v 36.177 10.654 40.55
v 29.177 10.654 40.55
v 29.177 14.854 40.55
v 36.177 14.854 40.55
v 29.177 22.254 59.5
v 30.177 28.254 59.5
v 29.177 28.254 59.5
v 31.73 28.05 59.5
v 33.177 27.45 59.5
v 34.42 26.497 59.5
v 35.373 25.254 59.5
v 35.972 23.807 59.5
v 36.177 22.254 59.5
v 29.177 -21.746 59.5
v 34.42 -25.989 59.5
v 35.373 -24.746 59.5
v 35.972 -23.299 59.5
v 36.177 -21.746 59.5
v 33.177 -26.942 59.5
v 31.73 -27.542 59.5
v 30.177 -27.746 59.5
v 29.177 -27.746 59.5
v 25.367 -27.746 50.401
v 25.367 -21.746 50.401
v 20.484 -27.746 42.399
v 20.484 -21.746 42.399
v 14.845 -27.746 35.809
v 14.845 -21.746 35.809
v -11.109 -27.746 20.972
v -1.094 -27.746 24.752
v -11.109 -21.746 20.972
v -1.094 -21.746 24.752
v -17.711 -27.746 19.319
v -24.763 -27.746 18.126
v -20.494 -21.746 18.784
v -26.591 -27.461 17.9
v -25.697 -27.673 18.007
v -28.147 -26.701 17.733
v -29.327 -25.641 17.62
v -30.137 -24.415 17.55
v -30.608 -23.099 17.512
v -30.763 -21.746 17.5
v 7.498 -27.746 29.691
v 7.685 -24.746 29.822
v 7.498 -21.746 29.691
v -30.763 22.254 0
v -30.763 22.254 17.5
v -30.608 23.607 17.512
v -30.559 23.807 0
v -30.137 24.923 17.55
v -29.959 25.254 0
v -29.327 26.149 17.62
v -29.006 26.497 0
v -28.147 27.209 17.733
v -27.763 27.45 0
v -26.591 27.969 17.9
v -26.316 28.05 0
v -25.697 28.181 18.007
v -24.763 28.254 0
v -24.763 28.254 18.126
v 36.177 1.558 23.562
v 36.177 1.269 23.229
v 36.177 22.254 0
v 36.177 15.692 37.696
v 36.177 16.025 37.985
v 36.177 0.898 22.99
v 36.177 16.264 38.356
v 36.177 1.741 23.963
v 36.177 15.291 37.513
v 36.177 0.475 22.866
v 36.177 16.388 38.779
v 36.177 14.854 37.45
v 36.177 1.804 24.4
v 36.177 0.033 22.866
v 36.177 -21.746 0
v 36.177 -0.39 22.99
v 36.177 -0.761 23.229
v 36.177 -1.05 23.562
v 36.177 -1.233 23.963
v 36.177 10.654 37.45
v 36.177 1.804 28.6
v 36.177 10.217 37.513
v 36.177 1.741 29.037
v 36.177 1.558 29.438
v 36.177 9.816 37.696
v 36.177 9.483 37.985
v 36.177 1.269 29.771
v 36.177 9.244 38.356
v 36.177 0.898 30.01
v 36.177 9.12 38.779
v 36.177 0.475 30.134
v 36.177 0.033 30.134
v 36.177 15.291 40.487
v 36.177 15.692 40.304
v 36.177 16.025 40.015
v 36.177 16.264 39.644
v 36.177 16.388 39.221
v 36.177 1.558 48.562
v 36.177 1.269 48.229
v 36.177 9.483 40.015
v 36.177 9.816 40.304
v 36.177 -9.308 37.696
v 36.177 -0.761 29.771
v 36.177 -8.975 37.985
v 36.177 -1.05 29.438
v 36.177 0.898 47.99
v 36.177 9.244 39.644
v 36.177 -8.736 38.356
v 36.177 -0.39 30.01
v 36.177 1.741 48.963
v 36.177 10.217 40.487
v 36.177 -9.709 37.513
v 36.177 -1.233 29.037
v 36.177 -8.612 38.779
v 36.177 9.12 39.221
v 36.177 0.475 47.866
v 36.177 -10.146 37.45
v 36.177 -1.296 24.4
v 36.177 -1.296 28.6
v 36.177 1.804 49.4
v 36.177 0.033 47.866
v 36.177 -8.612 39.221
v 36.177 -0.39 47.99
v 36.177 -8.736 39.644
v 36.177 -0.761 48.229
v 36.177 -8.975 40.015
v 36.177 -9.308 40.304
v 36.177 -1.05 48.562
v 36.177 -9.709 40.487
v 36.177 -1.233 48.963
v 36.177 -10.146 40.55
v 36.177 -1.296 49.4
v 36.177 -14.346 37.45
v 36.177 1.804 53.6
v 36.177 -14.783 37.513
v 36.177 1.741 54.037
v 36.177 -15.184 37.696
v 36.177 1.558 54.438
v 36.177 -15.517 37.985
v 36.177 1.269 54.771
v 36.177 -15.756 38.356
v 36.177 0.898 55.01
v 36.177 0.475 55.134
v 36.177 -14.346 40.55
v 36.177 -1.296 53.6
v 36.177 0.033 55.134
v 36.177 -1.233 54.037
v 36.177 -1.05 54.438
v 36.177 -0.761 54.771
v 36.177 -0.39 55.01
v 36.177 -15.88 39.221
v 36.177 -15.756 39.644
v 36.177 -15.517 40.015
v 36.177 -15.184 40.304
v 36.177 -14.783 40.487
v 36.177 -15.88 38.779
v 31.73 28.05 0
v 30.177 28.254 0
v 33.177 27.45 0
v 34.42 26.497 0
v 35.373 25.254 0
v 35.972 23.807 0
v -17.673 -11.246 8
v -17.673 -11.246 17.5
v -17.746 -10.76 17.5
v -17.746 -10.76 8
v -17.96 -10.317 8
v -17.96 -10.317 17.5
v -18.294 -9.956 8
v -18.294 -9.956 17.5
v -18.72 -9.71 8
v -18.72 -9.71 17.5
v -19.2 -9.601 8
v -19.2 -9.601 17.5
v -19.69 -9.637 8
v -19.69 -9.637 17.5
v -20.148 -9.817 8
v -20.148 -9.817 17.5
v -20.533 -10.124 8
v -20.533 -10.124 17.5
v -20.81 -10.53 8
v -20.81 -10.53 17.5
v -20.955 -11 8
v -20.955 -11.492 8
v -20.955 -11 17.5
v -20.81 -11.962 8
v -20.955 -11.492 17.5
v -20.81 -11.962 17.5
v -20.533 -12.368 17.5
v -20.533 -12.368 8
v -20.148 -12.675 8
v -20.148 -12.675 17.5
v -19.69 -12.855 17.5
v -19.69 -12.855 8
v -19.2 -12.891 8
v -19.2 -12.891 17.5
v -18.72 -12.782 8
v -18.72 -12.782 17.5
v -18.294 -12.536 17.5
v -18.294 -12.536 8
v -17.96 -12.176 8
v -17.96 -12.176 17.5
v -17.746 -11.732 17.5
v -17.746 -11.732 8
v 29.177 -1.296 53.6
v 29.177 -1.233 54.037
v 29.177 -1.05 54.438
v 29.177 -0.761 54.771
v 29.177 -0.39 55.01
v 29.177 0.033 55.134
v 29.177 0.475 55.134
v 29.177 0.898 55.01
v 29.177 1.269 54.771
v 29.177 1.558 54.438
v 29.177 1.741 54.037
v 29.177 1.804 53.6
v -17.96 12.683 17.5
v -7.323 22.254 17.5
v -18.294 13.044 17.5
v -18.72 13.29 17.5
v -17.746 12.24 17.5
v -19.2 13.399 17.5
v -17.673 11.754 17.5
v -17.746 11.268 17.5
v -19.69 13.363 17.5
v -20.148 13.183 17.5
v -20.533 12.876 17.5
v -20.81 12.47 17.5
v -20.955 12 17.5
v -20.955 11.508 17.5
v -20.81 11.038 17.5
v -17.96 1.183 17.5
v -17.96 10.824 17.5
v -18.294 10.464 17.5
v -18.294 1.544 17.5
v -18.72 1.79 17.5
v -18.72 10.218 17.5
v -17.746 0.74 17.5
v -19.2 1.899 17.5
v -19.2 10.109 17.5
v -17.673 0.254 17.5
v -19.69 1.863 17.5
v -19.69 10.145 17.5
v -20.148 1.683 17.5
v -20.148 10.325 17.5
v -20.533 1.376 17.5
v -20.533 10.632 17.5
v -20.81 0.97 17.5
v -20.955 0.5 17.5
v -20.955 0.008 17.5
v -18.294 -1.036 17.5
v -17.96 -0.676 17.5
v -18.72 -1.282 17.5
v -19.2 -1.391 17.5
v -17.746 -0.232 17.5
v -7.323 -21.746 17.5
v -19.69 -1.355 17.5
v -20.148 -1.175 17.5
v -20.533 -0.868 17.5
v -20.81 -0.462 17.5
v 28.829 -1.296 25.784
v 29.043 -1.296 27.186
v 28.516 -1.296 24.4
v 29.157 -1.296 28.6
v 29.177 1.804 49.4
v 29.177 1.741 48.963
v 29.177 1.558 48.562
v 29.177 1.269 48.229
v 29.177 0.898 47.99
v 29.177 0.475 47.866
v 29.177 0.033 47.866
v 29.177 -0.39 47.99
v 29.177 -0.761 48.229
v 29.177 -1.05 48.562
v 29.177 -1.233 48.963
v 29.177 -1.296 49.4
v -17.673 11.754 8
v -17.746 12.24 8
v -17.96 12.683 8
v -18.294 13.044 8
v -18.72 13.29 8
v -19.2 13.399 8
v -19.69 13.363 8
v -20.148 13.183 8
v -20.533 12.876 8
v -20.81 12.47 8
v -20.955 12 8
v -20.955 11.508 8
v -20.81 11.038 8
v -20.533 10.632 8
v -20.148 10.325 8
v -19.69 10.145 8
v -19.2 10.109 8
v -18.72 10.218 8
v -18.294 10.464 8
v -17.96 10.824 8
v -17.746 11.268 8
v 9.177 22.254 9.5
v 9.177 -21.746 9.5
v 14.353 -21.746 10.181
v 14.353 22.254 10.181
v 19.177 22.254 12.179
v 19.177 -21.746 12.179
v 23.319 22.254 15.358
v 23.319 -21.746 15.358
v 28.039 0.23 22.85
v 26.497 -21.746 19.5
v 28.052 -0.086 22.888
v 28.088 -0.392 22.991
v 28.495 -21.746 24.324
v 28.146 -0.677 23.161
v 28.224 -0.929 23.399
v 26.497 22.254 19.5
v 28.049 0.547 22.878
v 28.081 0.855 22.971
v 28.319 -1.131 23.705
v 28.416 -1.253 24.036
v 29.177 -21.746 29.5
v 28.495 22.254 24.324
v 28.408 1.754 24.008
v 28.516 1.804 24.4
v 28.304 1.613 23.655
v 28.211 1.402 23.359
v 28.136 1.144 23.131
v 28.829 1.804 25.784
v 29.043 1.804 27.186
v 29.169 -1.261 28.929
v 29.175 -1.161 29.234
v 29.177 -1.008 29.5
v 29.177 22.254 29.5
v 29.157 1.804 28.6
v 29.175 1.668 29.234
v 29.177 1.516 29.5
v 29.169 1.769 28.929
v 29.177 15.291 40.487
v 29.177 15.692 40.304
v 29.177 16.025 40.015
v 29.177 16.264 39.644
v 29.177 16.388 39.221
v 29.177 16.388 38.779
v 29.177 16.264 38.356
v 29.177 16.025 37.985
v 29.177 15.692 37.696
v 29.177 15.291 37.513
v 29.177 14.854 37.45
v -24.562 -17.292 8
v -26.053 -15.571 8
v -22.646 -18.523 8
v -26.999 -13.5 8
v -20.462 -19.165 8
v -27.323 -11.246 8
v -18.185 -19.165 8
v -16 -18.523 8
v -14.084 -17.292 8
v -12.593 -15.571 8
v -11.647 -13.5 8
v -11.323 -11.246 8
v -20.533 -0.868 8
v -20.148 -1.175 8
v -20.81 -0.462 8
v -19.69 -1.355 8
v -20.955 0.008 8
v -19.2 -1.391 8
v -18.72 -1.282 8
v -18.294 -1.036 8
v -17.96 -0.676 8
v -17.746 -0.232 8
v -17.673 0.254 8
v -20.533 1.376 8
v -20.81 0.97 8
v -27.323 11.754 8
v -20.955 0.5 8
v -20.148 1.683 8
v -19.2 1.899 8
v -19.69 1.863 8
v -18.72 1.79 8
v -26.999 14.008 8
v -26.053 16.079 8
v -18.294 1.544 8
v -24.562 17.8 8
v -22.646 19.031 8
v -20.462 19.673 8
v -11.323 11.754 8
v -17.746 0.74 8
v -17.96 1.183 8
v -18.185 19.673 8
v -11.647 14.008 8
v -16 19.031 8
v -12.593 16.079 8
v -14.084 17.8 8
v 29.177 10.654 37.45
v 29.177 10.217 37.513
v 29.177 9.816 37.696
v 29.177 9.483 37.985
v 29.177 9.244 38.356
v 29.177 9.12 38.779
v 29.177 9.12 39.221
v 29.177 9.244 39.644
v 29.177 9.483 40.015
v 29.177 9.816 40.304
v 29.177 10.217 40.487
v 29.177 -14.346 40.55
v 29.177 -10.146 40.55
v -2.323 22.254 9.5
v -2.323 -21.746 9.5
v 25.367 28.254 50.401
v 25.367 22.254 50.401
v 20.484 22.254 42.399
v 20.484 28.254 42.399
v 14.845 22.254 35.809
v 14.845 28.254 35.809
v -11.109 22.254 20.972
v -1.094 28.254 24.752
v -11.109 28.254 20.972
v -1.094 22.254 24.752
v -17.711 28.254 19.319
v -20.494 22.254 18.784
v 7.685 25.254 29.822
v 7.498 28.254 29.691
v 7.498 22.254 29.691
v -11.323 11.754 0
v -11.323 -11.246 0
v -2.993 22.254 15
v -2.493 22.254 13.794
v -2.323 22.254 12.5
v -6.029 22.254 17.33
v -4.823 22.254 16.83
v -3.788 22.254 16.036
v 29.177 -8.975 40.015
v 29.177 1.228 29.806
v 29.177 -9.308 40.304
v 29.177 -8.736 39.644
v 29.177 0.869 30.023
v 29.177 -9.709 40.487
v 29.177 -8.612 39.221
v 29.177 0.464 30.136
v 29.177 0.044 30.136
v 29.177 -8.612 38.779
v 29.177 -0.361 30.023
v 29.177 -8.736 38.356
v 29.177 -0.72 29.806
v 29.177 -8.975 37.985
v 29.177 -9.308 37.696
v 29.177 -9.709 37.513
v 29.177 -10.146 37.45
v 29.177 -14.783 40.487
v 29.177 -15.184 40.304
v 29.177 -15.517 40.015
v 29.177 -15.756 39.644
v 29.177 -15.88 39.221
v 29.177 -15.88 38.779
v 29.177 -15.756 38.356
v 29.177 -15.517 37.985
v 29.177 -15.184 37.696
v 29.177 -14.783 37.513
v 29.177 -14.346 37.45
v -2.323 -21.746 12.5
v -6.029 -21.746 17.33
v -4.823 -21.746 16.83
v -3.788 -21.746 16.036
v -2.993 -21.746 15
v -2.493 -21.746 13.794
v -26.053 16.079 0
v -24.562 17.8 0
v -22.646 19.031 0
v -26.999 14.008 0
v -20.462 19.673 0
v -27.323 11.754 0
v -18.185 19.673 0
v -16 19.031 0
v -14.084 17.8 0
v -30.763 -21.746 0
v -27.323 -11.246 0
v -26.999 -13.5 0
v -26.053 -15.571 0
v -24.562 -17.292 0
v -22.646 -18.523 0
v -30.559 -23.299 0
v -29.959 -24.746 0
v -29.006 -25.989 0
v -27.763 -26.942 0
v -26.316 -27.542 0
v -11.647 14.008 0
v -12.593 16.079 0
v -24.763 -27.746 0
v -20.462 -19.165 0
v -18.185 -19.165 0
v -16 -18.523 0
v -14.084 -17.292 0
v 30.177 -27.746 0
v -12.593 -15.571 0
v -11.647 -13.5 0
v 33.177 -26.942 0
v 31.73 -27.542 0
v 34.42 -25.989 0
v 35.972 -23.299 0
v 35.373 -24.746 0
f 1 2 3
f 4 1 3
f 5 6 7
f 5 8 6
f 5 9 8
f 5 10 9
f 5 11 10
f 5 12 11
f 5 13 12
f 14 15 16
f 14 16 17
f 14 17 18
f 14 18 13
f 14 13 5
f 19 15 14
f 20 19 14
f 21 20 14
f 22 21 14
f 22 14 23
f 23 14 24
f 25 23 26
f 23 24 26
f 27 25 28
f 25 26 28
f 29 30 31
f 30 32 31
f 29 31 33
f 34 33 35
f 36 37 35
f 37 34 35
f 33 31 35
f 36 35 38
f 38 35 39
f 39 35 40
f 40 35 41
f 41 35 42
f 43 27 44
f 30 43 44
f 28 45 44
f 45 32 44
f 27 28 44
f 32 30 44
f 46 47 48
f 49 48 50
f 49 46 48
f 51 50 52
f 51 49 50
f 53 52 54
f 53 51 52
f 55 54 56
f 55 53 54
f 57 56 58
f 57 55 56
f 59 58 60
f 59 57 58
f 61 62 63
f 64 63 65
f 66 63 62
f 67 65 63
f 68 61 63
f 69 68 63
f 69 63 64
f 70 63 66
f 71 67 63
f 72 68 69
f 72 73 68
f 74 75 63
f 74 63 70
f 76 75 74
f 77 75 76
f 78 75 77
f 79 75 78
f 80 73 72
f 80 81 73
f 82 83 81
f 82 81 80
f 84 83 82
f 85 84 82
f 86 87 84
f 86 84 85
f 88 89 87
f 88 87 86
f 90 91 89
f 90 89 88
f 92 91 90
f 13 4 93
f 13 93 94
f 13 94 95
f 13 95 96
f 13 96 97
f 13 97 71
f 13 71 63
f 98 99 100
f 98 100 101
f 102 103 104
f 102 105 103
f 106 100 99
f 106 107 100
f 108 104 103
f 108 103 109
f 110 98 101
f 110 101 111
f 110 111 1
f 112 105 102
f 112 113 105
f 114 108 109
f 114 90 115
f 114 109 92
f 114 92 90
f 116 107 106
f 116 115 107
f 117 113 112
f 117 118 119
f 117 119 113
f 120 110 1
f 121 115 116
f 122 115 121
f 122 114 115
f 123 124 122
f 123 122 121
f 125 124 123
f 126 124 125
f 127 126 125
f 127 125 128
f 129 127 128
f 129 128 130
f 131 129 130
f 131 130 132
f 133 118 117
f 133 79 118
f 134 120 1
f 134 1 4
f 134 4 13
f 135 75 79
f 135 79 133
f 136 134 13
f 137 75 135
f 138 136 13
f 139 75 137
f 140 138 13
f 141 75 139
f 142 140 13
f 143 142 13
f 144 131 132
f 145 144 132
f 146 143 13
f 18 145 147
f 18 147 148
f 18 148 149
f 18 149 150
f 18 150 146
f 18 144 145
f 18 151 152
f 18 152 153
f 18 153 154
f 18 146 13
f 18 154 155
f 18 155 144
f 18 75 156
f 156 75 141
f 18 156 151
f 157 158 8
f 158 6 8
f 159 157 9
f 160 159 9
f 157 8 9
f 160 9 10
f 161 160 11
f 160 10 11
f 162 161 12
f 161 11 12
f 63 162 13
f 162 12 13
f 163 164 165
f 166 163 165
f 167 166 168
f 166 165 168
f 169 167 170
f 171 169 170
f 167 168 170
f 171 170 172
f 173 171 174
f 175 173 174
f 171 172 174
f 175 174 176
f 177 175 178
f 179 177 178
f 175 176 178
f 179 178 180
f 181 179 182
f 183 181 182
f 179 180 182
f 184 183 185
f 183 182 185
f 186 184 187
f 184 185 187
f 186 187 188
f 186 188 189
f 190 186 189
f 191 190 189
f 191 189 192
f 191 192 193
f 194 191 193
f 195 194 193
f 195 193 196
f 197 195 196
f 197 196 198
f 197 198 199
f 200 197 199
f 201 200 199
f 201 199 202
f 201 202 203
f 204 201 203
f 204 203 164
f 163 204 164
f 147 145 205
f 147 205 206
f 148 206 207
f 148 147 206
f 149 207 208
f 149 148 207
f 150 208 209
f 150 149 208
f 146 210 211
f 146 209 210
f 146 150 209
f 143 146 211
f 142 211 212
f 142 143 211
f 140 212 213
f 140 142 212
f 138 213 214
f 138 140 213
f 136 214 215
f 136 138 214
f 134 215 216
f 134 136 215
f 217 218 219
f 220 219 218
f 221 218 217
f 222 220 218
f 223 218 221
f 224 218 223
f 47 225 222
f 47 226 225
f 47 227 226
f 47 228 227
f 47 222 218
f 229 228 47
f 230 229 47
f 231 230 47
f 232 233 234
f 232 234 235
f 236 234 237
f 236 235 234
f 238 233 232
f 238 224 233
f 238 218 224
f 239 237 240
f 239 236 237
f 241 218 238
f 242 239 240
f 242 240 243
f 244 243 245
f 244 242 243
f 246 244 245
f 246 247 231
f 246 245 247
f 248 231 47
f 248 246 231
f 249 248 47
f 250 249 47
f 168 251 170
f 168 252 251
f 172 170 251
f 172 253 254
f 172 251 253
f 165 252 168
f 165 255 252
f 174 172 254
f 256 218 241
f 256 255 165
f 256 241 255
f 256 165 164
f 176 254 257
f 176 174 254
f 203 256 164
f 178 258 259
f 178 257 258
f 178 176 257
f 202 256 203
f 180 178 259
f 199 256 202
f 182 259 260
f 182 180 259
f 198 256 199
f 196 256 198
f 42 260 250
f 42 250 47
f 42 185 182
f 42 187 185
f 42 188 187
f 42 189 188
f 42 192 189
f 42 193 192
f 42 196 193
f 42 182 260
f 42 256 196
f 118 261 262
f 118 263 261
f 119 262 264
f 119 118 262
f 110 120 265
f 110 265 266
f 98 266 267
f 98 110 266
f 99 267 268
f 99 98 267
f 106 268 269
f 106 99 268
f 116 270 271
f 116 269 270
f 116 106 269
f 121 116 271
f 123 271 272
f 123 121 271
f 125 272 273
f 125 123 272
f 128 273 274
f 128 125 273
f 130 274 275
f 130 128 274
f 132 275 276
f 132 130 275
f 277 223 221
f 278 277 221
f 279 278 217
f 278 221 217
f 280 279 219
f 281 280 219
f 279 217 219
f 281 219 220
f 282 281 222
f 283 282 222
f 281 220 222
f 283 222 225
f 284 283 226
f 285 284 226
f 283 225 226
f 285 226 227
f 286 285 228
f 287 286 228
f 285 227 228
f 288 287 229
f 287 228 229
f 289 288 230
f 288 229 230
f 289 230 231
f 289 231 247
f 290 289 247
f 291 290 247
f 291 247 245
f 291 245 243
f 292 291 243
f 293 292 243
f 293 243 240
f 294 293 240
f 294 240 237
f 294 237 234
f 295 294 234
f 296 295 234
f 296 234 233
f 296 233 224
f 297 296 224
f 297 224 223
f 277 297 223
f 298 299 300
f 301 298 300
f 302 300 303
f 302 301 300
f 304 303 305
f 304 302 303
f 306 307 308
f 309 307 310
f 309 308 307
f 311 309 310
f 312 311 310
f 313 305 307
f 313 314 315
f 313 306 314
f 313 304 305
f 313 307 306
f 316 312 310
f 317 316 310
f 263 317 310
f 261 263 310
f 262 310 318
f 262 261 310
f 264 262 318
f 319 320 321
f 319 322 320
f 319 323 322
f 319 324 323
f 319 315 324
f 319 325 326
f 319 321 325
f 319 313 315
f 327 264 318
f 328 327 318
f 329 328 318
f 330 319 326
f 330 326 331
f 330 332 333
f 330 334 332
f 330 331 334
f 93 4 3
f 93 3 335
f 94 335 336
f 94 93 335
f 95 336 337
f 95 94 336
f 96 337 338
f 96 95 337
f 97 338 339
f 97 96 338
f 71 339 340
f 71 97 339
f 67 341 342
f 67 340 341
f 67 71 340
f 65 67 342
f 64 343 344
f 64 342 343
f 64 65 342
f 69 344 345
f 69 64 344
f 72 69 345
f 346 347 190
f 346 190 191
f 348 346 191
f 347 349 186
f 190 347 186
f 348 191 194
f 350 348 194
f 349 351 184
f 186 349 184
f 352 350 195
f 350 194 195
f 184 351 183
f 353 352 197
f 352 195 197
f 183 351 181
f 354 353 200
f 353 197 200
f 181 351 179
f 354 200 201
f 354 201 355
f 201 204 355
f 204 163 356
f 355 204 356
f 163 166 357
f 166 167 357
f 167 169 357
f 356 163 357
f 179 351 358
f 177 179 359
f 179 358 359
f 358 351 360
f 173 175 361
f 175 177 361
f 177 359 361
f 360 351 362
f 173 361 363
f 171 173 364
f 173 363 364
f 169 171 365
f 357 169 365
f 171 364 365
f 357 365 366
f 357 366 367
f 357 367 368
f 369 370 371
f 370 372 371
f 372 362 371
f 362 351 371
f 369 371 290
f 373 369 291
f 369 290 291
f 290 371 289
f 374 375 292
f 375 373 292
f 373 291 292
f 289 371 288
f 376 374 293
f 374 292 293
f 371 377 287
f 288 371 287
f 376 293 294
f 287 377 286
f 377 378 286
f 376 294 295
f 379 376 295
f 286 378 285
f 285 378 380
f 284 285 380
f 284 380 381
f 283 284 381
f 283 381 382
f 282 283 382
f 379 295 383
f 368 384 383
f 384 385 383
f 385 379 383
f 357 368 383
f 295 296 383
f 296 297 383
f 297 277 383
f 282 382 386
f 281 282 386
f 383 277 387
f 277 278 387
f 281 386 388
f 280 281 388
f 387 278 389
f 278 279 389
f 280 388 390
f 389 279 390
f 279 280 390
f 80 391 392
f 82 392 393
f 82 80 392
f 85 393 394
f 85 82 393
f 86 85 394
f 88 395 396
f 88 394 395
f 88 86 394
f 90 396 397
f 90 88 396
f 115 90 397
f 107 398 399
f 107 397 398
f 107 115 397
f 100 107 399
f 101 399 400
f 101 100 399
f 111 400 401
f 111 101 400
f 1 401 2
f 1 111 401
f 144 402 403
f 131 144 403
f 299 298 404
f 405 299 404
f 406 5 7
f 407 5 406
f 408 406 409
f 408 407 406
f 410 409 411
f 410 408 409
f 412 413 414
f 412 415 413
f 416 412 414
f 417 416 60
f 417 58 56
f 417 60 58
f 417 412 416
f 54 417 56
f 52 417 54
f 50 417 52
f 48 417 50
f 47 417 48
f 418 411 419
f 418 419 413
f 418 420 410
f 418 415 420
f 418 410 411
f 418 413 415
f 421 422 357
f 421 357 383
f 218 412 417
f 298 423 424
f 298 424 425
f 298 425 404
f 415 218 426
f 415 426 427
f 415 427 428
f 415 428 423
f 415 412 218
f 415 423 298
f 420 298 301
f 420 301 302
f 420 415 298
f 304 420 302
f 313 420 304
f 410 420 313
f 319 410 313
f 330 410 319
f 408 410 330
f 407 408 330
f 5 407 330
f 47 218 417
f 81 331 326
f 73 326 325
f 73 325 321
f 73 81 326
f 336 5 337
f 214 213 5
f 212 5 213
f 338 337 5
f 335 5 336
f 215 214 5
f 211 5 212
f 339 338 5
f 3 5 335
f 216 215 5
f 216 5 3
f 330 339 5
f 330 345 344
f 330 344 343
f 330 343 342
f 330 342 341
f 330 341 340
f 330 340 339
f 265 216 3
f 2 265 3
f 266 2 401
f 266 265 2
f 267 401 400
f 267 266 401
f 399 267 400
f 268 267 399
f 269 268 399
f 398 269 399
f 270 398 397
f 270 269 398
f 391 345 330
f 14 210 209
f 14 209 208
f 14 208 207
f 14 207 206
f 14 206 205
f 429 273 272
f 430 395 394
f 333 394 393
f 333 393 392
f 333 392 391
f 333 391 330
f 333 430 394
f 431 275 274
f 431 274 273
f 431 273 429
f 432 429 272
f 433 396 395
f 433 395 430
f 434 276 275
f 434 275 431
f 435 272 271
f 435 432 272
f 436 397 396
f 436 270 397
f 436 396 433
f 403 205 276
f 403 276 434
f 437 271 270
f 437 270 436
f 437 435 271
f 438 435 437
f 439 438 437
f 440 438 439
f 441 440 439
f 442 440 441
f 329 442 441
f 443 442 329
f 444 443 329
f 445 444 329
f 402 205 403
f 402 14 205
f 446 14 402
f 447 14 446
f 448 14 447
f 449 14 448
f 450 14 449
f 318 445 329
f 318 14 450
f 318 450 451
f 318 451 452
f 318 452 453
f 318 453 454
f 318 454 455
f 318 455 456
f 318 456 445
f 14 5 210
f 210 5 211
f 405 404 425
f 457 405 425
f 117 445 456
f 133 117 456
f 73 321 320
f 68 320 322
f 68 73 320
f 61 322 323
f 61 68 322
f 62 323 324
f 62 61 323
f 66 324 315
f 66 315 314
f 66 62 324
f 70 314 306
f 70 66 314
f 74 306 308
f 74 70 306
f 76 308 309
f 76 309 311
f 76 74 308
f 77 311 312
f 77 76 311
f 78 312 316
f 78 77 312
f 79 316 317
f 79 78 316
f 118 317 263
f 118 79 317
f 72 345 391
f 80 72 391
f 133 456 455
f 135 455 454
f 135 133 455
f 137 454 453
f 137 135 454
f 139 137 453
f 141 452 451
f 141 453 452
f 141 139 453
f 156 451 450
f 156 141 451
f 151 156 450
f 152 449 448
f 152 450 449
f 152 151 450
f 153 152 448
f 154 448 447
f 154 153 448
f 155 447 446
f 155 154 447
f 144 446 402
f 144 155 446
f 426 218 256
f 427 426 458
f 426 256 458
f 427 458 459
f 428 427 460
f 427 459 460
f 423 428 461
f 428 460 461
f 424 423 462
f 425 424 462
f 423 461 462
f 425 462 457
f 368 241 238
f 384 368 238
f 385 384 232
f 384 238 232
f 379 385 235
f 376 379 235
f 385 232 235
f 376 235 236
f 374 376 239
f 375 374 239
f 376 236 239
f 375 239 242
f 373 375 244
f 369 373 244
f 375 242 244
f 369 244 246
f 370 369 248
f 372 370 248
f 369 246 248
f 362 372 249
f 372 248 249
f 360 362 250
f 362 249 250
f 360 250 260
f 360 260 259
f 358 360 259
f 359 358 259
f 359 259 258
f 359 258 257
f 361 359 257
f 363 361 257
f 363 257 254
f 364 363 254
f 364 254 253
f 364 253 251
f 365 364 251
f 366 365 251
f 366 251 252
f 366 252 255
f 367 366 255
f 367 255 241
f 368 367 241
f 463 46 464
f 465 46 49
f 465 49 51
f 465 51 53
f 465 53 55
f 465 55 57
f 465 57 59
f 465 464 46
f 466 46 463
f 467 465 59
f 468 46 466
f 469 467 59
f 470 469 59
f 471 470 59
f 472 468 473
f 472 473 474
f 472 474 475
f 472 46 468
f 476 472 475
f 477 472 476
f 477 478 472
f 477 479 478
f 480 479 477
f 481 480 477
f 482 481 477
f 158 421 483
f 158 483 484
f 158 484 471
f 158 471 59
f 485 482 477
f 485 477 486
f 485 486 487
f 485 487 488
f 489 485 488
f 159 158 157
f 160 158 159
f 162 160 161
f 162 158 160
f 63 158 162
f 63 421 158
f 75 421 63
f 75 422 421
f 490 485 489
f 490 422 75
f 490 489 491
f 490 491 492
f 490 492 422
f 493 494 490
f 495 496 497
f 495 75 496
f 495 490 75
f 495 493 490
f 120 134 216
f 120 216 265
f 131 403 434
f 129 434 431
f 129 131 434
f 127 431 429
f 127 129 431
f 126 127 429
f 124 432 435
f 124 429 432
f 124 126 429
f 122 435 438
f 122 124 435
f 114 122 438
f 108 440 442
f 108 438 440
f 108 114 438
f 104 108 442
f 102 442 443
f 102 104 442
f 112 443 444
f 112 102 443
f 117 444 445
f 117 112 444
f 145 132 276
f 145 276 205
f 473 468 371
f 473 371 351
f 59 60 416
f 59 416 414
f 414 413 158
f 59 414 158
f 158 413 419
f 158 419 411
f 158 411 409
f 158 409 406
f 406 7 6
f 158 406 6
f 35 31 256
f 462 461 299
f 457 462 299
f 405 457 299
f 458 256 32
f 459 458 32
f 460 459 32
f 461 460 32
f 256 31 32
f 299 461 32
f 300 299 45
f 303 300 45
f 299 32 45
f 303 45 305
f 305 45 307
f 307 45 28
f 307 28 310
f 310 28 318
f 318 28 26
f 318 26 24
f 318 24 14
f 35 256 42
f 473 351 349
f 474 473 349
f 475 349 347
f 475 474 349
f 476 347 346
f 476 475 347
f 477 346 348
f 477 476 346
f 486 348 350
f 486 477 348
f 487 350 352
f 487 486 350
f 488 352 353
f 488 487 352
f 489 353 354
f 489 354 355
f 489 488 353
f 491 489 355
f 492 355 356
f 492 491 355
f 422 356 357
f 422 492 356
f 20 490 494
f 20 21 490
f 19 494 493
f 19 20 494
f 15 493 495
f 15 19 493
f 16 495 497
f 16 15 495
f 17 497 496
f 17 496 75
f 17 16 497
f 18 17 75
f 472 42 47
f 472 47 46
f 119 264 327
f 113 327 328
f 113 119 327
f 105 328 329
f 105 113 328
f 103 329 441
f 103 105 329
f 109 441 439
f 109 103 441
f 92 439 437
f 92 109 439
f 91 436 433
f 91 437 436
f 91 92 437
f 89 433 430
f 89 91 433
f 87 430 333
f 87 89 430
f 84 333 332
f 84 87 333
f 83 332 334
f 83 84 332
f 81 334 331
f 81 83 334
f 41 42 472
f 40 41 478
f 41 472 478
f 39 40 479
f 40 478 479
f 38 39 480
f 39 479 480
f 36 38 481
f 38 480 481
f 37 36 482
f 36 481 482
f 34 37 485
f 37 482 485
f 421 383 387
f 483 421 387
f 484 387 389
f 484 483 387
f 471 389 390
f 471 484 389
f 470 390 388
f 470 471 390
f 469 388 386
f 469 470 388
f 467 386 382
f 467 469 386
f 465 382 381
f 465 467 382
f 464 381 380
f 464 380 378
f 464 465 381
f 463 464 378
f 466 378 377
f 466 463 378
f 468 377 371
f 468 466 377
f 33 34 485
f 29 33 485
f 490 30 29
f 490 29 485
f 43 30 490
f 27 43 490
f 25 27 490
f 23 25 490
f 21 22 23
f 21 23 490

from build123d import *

# Parameters (mm, degrees)
ESBO_O1_W                = 66.94
ESBO_O1_H                = 40
RESSALTO_EXTRUS_O1_DEPTH = 9.5
ESBO_O2_W                = 7
ESBO_O2_H                = 40
RESSALTO_EXTRUS_O2_DEPTH = 50
ESBO_O3_W                = 28.44
ESBO_O3_H                = 40
RESSALTO_EXTRUS_O3_DEPTH = 8
RESSALTO_EXTRUS_O4_DEPTH = 2
RESSALTO_EXTRUS_O5_DEPTH = 6
FILETE1_R                = 5
FILETE2_R                = 20
ESBO_O6_R                = 1.65
CORTE_EXTRUS_O1_DEPTH    = 63.217786628
CORTE_EXTRUS_O2_DEPTH    = 8
FILETE4_R                = 6
CORTE_EXTRUS_O3_DEPTH    = 94.912194911


with BuildPart() as part:
    # Esboço1 → Ressalto-extrusão1 (new body)
    with BuildSketch(Plane.XY):
        with Locations((2.706874237, 0.253968254)):
            Rectangle(ESBO_O1_W, ESBO_O1_H)
    extrude(amount=RESSALTO_EXTRUS_O1_DEPTH)

    # Esboço2 → Ressalto-extrusão2 (add)
    with BuildSketch(Plane.XY.offset(9.5)):
        with Locations((32.676874237, 0.253968254)):
            Rectangle(ESBO_O2_W, ESBO_O2_H)
    extrude(amount=RESSALTO_EXTRUS_O2_DEPTH)

    # Esboço3 → Ressalto-extrusão3 (add)
    with BuildSketch(Plane.XY.offset(9.5)):
        with Locations((-16.543125763, 0.253968254)):
            Rectangle(ESBO_O3_W, ESBO_O3_H)
    extrude(amount=RESSALTO_EXTRUS_O3_DEPTH)

    # Esboço4 → Ressalto-extrusão4 (add)
    with BuildSketch(Plane.XZ.offset(19.746031746)):
        Polygon((-2.323125763, 9.5), (-2.323125763, 17.5), (-30.763125763, 17.5), (-30.763125763, 0), (36.176874237, 0), (36.176874237, 59.5), (29.176874237, 59.5), (29.176874237, 9.5), align=None)
    ressalto_extrus_o4 = extrude(amount=RESSALTO_EXTRUS_O4_DEPTH)

    # Espelhar1: Ressalto-extrusão4 across plane
    add(ressalto_extrus_o4.mirror(Plane.ZX.offset(0.253968254)))

    # Esboço5 → Ressalto-extrusão5 (add)
    with BuildSketch(Plane.XZ.offset(21.746031746)):
        with BuildLine():
            Line((36.176874237, 59.5), (29.176874237, 59.5))
            add(Edge.make_bspline(
                [(29.176874237, 59.5), (16.163128622, 21.143295095), (-30.763125763, 17.5)],
                knots=[0, 0, 0, 1, 1, 1], degree=2))
            Line((-30.763125763, 17.5), (-30.763125763, 0))
            Line((-30.763125763, 0), (36.176874237, 0))
            Line((36.176874237, 0), (36.176874237, 59.5))
        make_face()
    ressalto_extrus_o5 = extrude(amount=RESSALTO_EXTRUS_O5_DEPTH)

    # Espelhar2: Ressalto-extrusão5 across plane
    add(ressalto_extrus_o5.mirror(Plane.ZX.offset(0.253968254)))

    # Filete1
    filete1_edges = [part.edges().sort_by_distance(p)[0] for p in [
        (-2.323125763, 0.253968254, 17.5),
    ]]
    fillet(filete1_edges, radius=FILETE1_R)

    # Filete2
    filete2_edges = [part.edges().sort_by_distance(p)[0] for p in [
        (29.176874237, 0.253968254, 9.5),
    ]]
    fillet(filete2_edges, radius=FILETE2_R)

    # Esboço6 → Corte-extrusão1 (cut, through all)
    with BuildSketch(Plane.XY.offset(17.5)):
        with Locations((-19.323125763, 11.753968254)):
            Circle(ESBO_O6_R)
        with Locations((-19.323125763, 0.253968254)):
            Circle(ESBO_O6_R)
        with Locations((-19.323125763, -11.246031746)):
            Circle(ESBO_O6_R)
    extrude(amount=-CORTE_EXTRUS_O1_DEPTH, mode=Mode.SUBTRACT)

    # Esboço7 → Corte-extrusão2 (cut)
    with BuildSketch(Plane(origin=(0, 0, 0), x_dir=(-1, 0, 0), z_dir=(0, 0, -1))):
        with BuildLine():
            Line((27.323125763, 11.753968254), (27.323125763, -11.246031746))
            ThreePointArc((27.323125763, -11.246031746), (19.323125763, -19.246031746), (11.323125763, -11.246031746))
            Line((11.323125763, -11.246031746), (11.323125763, 11.753968254))
            ThreePointArc((11.323125763, 11.753968254), (19.323125763, 19.753968254), (27.323125763, 11.753968254))
        make_face()
    extrude(amount=-CORTE_EXTRUS_O2_DEPTH, mode=Mode.SUBTRACT)

    # Filete4
    filete4_edges = [part.edges().sort_by_distance(p)[0] for p in [
        (36.176874237, 28.253968254, 29.75),
        (-30.763125763, 28.253968254, 8.75),
        (-30.763125763, -27.746031746, 8.75),
        (36.176874237, -27.746031746, 29.75),
    ]]
    fillet(filete4_edges, radius=FILETE4_R)

    # Esboço8 → Corte-extrusão3 (cut, through all)
    with BuildSketch(Plane(origin=(36.176874237, 0, 0), x_dir=(0, 0, -1), z_dir=(1, 0, 0))):
        with BuildLine():
            Line((-53.6, 1.803968254), (-49.4, 1.803968254))
            ThreePointArc((-49.4, 1.803968254), (-47.85, 0.253968254), (-49.4, -1.296031746))
            Line((-49.4, -1.296031746), (-53.6, -1.296031746))
            ThreePointArc((-53.6, -1.296031746), (-55.15, 0.253968254), (-53.6, 1.803968254))
        make_face()
        with BuildLine():
            Line((-40.55, -14.346031746), (-40.55, -10.146031746))
            ThreePointArc((-40.55, -10.146031746), (-39, -8.596031746), (-37.45, -10.146031746))
            Line((-37.45, -10.146031746), (-37.45, -14.346031746))
            ThreePointArc((-37.45, -14.346031746), (-39, -15.896031746), (-40.55, -14.346031746))
        make_face()
        with BuildLine():
            Line((-24.4, -1.296031746), (-28.6, -1.296031746))
            ThreePointArc((-28.6, -1.296031746), (-30.15, 0.253968254), (-28.6, 1.803968254))
            Line((-28.6, 1.803968254), (-24.4, 1.803968254))
            ThreePointArc((-24.4, 1.803968254), (-22.85, 0.253968254), (-24.4, -1.296031746))
        make_face()
        with BuildLine():
            Line((-37.45, 14.853968254), (-37.45, 10.653968254))
            ThreePointArc((-37.45, 10.653968254), (-39, 9.103968254), (-40.55, 10.653968254))
            Line((-40.55, 10.653968254), (-40.55, 14.853968254))
            ThreePointArc((-40.55, 14.853968254), (-39, 16.403968254), (-37.45, 14.853968254))
        make_face()
    extrude(amount=-CORTE_EXTRUS_O3_DEPTH, mode=Mode.SUBTRACT)


solid = part.part
